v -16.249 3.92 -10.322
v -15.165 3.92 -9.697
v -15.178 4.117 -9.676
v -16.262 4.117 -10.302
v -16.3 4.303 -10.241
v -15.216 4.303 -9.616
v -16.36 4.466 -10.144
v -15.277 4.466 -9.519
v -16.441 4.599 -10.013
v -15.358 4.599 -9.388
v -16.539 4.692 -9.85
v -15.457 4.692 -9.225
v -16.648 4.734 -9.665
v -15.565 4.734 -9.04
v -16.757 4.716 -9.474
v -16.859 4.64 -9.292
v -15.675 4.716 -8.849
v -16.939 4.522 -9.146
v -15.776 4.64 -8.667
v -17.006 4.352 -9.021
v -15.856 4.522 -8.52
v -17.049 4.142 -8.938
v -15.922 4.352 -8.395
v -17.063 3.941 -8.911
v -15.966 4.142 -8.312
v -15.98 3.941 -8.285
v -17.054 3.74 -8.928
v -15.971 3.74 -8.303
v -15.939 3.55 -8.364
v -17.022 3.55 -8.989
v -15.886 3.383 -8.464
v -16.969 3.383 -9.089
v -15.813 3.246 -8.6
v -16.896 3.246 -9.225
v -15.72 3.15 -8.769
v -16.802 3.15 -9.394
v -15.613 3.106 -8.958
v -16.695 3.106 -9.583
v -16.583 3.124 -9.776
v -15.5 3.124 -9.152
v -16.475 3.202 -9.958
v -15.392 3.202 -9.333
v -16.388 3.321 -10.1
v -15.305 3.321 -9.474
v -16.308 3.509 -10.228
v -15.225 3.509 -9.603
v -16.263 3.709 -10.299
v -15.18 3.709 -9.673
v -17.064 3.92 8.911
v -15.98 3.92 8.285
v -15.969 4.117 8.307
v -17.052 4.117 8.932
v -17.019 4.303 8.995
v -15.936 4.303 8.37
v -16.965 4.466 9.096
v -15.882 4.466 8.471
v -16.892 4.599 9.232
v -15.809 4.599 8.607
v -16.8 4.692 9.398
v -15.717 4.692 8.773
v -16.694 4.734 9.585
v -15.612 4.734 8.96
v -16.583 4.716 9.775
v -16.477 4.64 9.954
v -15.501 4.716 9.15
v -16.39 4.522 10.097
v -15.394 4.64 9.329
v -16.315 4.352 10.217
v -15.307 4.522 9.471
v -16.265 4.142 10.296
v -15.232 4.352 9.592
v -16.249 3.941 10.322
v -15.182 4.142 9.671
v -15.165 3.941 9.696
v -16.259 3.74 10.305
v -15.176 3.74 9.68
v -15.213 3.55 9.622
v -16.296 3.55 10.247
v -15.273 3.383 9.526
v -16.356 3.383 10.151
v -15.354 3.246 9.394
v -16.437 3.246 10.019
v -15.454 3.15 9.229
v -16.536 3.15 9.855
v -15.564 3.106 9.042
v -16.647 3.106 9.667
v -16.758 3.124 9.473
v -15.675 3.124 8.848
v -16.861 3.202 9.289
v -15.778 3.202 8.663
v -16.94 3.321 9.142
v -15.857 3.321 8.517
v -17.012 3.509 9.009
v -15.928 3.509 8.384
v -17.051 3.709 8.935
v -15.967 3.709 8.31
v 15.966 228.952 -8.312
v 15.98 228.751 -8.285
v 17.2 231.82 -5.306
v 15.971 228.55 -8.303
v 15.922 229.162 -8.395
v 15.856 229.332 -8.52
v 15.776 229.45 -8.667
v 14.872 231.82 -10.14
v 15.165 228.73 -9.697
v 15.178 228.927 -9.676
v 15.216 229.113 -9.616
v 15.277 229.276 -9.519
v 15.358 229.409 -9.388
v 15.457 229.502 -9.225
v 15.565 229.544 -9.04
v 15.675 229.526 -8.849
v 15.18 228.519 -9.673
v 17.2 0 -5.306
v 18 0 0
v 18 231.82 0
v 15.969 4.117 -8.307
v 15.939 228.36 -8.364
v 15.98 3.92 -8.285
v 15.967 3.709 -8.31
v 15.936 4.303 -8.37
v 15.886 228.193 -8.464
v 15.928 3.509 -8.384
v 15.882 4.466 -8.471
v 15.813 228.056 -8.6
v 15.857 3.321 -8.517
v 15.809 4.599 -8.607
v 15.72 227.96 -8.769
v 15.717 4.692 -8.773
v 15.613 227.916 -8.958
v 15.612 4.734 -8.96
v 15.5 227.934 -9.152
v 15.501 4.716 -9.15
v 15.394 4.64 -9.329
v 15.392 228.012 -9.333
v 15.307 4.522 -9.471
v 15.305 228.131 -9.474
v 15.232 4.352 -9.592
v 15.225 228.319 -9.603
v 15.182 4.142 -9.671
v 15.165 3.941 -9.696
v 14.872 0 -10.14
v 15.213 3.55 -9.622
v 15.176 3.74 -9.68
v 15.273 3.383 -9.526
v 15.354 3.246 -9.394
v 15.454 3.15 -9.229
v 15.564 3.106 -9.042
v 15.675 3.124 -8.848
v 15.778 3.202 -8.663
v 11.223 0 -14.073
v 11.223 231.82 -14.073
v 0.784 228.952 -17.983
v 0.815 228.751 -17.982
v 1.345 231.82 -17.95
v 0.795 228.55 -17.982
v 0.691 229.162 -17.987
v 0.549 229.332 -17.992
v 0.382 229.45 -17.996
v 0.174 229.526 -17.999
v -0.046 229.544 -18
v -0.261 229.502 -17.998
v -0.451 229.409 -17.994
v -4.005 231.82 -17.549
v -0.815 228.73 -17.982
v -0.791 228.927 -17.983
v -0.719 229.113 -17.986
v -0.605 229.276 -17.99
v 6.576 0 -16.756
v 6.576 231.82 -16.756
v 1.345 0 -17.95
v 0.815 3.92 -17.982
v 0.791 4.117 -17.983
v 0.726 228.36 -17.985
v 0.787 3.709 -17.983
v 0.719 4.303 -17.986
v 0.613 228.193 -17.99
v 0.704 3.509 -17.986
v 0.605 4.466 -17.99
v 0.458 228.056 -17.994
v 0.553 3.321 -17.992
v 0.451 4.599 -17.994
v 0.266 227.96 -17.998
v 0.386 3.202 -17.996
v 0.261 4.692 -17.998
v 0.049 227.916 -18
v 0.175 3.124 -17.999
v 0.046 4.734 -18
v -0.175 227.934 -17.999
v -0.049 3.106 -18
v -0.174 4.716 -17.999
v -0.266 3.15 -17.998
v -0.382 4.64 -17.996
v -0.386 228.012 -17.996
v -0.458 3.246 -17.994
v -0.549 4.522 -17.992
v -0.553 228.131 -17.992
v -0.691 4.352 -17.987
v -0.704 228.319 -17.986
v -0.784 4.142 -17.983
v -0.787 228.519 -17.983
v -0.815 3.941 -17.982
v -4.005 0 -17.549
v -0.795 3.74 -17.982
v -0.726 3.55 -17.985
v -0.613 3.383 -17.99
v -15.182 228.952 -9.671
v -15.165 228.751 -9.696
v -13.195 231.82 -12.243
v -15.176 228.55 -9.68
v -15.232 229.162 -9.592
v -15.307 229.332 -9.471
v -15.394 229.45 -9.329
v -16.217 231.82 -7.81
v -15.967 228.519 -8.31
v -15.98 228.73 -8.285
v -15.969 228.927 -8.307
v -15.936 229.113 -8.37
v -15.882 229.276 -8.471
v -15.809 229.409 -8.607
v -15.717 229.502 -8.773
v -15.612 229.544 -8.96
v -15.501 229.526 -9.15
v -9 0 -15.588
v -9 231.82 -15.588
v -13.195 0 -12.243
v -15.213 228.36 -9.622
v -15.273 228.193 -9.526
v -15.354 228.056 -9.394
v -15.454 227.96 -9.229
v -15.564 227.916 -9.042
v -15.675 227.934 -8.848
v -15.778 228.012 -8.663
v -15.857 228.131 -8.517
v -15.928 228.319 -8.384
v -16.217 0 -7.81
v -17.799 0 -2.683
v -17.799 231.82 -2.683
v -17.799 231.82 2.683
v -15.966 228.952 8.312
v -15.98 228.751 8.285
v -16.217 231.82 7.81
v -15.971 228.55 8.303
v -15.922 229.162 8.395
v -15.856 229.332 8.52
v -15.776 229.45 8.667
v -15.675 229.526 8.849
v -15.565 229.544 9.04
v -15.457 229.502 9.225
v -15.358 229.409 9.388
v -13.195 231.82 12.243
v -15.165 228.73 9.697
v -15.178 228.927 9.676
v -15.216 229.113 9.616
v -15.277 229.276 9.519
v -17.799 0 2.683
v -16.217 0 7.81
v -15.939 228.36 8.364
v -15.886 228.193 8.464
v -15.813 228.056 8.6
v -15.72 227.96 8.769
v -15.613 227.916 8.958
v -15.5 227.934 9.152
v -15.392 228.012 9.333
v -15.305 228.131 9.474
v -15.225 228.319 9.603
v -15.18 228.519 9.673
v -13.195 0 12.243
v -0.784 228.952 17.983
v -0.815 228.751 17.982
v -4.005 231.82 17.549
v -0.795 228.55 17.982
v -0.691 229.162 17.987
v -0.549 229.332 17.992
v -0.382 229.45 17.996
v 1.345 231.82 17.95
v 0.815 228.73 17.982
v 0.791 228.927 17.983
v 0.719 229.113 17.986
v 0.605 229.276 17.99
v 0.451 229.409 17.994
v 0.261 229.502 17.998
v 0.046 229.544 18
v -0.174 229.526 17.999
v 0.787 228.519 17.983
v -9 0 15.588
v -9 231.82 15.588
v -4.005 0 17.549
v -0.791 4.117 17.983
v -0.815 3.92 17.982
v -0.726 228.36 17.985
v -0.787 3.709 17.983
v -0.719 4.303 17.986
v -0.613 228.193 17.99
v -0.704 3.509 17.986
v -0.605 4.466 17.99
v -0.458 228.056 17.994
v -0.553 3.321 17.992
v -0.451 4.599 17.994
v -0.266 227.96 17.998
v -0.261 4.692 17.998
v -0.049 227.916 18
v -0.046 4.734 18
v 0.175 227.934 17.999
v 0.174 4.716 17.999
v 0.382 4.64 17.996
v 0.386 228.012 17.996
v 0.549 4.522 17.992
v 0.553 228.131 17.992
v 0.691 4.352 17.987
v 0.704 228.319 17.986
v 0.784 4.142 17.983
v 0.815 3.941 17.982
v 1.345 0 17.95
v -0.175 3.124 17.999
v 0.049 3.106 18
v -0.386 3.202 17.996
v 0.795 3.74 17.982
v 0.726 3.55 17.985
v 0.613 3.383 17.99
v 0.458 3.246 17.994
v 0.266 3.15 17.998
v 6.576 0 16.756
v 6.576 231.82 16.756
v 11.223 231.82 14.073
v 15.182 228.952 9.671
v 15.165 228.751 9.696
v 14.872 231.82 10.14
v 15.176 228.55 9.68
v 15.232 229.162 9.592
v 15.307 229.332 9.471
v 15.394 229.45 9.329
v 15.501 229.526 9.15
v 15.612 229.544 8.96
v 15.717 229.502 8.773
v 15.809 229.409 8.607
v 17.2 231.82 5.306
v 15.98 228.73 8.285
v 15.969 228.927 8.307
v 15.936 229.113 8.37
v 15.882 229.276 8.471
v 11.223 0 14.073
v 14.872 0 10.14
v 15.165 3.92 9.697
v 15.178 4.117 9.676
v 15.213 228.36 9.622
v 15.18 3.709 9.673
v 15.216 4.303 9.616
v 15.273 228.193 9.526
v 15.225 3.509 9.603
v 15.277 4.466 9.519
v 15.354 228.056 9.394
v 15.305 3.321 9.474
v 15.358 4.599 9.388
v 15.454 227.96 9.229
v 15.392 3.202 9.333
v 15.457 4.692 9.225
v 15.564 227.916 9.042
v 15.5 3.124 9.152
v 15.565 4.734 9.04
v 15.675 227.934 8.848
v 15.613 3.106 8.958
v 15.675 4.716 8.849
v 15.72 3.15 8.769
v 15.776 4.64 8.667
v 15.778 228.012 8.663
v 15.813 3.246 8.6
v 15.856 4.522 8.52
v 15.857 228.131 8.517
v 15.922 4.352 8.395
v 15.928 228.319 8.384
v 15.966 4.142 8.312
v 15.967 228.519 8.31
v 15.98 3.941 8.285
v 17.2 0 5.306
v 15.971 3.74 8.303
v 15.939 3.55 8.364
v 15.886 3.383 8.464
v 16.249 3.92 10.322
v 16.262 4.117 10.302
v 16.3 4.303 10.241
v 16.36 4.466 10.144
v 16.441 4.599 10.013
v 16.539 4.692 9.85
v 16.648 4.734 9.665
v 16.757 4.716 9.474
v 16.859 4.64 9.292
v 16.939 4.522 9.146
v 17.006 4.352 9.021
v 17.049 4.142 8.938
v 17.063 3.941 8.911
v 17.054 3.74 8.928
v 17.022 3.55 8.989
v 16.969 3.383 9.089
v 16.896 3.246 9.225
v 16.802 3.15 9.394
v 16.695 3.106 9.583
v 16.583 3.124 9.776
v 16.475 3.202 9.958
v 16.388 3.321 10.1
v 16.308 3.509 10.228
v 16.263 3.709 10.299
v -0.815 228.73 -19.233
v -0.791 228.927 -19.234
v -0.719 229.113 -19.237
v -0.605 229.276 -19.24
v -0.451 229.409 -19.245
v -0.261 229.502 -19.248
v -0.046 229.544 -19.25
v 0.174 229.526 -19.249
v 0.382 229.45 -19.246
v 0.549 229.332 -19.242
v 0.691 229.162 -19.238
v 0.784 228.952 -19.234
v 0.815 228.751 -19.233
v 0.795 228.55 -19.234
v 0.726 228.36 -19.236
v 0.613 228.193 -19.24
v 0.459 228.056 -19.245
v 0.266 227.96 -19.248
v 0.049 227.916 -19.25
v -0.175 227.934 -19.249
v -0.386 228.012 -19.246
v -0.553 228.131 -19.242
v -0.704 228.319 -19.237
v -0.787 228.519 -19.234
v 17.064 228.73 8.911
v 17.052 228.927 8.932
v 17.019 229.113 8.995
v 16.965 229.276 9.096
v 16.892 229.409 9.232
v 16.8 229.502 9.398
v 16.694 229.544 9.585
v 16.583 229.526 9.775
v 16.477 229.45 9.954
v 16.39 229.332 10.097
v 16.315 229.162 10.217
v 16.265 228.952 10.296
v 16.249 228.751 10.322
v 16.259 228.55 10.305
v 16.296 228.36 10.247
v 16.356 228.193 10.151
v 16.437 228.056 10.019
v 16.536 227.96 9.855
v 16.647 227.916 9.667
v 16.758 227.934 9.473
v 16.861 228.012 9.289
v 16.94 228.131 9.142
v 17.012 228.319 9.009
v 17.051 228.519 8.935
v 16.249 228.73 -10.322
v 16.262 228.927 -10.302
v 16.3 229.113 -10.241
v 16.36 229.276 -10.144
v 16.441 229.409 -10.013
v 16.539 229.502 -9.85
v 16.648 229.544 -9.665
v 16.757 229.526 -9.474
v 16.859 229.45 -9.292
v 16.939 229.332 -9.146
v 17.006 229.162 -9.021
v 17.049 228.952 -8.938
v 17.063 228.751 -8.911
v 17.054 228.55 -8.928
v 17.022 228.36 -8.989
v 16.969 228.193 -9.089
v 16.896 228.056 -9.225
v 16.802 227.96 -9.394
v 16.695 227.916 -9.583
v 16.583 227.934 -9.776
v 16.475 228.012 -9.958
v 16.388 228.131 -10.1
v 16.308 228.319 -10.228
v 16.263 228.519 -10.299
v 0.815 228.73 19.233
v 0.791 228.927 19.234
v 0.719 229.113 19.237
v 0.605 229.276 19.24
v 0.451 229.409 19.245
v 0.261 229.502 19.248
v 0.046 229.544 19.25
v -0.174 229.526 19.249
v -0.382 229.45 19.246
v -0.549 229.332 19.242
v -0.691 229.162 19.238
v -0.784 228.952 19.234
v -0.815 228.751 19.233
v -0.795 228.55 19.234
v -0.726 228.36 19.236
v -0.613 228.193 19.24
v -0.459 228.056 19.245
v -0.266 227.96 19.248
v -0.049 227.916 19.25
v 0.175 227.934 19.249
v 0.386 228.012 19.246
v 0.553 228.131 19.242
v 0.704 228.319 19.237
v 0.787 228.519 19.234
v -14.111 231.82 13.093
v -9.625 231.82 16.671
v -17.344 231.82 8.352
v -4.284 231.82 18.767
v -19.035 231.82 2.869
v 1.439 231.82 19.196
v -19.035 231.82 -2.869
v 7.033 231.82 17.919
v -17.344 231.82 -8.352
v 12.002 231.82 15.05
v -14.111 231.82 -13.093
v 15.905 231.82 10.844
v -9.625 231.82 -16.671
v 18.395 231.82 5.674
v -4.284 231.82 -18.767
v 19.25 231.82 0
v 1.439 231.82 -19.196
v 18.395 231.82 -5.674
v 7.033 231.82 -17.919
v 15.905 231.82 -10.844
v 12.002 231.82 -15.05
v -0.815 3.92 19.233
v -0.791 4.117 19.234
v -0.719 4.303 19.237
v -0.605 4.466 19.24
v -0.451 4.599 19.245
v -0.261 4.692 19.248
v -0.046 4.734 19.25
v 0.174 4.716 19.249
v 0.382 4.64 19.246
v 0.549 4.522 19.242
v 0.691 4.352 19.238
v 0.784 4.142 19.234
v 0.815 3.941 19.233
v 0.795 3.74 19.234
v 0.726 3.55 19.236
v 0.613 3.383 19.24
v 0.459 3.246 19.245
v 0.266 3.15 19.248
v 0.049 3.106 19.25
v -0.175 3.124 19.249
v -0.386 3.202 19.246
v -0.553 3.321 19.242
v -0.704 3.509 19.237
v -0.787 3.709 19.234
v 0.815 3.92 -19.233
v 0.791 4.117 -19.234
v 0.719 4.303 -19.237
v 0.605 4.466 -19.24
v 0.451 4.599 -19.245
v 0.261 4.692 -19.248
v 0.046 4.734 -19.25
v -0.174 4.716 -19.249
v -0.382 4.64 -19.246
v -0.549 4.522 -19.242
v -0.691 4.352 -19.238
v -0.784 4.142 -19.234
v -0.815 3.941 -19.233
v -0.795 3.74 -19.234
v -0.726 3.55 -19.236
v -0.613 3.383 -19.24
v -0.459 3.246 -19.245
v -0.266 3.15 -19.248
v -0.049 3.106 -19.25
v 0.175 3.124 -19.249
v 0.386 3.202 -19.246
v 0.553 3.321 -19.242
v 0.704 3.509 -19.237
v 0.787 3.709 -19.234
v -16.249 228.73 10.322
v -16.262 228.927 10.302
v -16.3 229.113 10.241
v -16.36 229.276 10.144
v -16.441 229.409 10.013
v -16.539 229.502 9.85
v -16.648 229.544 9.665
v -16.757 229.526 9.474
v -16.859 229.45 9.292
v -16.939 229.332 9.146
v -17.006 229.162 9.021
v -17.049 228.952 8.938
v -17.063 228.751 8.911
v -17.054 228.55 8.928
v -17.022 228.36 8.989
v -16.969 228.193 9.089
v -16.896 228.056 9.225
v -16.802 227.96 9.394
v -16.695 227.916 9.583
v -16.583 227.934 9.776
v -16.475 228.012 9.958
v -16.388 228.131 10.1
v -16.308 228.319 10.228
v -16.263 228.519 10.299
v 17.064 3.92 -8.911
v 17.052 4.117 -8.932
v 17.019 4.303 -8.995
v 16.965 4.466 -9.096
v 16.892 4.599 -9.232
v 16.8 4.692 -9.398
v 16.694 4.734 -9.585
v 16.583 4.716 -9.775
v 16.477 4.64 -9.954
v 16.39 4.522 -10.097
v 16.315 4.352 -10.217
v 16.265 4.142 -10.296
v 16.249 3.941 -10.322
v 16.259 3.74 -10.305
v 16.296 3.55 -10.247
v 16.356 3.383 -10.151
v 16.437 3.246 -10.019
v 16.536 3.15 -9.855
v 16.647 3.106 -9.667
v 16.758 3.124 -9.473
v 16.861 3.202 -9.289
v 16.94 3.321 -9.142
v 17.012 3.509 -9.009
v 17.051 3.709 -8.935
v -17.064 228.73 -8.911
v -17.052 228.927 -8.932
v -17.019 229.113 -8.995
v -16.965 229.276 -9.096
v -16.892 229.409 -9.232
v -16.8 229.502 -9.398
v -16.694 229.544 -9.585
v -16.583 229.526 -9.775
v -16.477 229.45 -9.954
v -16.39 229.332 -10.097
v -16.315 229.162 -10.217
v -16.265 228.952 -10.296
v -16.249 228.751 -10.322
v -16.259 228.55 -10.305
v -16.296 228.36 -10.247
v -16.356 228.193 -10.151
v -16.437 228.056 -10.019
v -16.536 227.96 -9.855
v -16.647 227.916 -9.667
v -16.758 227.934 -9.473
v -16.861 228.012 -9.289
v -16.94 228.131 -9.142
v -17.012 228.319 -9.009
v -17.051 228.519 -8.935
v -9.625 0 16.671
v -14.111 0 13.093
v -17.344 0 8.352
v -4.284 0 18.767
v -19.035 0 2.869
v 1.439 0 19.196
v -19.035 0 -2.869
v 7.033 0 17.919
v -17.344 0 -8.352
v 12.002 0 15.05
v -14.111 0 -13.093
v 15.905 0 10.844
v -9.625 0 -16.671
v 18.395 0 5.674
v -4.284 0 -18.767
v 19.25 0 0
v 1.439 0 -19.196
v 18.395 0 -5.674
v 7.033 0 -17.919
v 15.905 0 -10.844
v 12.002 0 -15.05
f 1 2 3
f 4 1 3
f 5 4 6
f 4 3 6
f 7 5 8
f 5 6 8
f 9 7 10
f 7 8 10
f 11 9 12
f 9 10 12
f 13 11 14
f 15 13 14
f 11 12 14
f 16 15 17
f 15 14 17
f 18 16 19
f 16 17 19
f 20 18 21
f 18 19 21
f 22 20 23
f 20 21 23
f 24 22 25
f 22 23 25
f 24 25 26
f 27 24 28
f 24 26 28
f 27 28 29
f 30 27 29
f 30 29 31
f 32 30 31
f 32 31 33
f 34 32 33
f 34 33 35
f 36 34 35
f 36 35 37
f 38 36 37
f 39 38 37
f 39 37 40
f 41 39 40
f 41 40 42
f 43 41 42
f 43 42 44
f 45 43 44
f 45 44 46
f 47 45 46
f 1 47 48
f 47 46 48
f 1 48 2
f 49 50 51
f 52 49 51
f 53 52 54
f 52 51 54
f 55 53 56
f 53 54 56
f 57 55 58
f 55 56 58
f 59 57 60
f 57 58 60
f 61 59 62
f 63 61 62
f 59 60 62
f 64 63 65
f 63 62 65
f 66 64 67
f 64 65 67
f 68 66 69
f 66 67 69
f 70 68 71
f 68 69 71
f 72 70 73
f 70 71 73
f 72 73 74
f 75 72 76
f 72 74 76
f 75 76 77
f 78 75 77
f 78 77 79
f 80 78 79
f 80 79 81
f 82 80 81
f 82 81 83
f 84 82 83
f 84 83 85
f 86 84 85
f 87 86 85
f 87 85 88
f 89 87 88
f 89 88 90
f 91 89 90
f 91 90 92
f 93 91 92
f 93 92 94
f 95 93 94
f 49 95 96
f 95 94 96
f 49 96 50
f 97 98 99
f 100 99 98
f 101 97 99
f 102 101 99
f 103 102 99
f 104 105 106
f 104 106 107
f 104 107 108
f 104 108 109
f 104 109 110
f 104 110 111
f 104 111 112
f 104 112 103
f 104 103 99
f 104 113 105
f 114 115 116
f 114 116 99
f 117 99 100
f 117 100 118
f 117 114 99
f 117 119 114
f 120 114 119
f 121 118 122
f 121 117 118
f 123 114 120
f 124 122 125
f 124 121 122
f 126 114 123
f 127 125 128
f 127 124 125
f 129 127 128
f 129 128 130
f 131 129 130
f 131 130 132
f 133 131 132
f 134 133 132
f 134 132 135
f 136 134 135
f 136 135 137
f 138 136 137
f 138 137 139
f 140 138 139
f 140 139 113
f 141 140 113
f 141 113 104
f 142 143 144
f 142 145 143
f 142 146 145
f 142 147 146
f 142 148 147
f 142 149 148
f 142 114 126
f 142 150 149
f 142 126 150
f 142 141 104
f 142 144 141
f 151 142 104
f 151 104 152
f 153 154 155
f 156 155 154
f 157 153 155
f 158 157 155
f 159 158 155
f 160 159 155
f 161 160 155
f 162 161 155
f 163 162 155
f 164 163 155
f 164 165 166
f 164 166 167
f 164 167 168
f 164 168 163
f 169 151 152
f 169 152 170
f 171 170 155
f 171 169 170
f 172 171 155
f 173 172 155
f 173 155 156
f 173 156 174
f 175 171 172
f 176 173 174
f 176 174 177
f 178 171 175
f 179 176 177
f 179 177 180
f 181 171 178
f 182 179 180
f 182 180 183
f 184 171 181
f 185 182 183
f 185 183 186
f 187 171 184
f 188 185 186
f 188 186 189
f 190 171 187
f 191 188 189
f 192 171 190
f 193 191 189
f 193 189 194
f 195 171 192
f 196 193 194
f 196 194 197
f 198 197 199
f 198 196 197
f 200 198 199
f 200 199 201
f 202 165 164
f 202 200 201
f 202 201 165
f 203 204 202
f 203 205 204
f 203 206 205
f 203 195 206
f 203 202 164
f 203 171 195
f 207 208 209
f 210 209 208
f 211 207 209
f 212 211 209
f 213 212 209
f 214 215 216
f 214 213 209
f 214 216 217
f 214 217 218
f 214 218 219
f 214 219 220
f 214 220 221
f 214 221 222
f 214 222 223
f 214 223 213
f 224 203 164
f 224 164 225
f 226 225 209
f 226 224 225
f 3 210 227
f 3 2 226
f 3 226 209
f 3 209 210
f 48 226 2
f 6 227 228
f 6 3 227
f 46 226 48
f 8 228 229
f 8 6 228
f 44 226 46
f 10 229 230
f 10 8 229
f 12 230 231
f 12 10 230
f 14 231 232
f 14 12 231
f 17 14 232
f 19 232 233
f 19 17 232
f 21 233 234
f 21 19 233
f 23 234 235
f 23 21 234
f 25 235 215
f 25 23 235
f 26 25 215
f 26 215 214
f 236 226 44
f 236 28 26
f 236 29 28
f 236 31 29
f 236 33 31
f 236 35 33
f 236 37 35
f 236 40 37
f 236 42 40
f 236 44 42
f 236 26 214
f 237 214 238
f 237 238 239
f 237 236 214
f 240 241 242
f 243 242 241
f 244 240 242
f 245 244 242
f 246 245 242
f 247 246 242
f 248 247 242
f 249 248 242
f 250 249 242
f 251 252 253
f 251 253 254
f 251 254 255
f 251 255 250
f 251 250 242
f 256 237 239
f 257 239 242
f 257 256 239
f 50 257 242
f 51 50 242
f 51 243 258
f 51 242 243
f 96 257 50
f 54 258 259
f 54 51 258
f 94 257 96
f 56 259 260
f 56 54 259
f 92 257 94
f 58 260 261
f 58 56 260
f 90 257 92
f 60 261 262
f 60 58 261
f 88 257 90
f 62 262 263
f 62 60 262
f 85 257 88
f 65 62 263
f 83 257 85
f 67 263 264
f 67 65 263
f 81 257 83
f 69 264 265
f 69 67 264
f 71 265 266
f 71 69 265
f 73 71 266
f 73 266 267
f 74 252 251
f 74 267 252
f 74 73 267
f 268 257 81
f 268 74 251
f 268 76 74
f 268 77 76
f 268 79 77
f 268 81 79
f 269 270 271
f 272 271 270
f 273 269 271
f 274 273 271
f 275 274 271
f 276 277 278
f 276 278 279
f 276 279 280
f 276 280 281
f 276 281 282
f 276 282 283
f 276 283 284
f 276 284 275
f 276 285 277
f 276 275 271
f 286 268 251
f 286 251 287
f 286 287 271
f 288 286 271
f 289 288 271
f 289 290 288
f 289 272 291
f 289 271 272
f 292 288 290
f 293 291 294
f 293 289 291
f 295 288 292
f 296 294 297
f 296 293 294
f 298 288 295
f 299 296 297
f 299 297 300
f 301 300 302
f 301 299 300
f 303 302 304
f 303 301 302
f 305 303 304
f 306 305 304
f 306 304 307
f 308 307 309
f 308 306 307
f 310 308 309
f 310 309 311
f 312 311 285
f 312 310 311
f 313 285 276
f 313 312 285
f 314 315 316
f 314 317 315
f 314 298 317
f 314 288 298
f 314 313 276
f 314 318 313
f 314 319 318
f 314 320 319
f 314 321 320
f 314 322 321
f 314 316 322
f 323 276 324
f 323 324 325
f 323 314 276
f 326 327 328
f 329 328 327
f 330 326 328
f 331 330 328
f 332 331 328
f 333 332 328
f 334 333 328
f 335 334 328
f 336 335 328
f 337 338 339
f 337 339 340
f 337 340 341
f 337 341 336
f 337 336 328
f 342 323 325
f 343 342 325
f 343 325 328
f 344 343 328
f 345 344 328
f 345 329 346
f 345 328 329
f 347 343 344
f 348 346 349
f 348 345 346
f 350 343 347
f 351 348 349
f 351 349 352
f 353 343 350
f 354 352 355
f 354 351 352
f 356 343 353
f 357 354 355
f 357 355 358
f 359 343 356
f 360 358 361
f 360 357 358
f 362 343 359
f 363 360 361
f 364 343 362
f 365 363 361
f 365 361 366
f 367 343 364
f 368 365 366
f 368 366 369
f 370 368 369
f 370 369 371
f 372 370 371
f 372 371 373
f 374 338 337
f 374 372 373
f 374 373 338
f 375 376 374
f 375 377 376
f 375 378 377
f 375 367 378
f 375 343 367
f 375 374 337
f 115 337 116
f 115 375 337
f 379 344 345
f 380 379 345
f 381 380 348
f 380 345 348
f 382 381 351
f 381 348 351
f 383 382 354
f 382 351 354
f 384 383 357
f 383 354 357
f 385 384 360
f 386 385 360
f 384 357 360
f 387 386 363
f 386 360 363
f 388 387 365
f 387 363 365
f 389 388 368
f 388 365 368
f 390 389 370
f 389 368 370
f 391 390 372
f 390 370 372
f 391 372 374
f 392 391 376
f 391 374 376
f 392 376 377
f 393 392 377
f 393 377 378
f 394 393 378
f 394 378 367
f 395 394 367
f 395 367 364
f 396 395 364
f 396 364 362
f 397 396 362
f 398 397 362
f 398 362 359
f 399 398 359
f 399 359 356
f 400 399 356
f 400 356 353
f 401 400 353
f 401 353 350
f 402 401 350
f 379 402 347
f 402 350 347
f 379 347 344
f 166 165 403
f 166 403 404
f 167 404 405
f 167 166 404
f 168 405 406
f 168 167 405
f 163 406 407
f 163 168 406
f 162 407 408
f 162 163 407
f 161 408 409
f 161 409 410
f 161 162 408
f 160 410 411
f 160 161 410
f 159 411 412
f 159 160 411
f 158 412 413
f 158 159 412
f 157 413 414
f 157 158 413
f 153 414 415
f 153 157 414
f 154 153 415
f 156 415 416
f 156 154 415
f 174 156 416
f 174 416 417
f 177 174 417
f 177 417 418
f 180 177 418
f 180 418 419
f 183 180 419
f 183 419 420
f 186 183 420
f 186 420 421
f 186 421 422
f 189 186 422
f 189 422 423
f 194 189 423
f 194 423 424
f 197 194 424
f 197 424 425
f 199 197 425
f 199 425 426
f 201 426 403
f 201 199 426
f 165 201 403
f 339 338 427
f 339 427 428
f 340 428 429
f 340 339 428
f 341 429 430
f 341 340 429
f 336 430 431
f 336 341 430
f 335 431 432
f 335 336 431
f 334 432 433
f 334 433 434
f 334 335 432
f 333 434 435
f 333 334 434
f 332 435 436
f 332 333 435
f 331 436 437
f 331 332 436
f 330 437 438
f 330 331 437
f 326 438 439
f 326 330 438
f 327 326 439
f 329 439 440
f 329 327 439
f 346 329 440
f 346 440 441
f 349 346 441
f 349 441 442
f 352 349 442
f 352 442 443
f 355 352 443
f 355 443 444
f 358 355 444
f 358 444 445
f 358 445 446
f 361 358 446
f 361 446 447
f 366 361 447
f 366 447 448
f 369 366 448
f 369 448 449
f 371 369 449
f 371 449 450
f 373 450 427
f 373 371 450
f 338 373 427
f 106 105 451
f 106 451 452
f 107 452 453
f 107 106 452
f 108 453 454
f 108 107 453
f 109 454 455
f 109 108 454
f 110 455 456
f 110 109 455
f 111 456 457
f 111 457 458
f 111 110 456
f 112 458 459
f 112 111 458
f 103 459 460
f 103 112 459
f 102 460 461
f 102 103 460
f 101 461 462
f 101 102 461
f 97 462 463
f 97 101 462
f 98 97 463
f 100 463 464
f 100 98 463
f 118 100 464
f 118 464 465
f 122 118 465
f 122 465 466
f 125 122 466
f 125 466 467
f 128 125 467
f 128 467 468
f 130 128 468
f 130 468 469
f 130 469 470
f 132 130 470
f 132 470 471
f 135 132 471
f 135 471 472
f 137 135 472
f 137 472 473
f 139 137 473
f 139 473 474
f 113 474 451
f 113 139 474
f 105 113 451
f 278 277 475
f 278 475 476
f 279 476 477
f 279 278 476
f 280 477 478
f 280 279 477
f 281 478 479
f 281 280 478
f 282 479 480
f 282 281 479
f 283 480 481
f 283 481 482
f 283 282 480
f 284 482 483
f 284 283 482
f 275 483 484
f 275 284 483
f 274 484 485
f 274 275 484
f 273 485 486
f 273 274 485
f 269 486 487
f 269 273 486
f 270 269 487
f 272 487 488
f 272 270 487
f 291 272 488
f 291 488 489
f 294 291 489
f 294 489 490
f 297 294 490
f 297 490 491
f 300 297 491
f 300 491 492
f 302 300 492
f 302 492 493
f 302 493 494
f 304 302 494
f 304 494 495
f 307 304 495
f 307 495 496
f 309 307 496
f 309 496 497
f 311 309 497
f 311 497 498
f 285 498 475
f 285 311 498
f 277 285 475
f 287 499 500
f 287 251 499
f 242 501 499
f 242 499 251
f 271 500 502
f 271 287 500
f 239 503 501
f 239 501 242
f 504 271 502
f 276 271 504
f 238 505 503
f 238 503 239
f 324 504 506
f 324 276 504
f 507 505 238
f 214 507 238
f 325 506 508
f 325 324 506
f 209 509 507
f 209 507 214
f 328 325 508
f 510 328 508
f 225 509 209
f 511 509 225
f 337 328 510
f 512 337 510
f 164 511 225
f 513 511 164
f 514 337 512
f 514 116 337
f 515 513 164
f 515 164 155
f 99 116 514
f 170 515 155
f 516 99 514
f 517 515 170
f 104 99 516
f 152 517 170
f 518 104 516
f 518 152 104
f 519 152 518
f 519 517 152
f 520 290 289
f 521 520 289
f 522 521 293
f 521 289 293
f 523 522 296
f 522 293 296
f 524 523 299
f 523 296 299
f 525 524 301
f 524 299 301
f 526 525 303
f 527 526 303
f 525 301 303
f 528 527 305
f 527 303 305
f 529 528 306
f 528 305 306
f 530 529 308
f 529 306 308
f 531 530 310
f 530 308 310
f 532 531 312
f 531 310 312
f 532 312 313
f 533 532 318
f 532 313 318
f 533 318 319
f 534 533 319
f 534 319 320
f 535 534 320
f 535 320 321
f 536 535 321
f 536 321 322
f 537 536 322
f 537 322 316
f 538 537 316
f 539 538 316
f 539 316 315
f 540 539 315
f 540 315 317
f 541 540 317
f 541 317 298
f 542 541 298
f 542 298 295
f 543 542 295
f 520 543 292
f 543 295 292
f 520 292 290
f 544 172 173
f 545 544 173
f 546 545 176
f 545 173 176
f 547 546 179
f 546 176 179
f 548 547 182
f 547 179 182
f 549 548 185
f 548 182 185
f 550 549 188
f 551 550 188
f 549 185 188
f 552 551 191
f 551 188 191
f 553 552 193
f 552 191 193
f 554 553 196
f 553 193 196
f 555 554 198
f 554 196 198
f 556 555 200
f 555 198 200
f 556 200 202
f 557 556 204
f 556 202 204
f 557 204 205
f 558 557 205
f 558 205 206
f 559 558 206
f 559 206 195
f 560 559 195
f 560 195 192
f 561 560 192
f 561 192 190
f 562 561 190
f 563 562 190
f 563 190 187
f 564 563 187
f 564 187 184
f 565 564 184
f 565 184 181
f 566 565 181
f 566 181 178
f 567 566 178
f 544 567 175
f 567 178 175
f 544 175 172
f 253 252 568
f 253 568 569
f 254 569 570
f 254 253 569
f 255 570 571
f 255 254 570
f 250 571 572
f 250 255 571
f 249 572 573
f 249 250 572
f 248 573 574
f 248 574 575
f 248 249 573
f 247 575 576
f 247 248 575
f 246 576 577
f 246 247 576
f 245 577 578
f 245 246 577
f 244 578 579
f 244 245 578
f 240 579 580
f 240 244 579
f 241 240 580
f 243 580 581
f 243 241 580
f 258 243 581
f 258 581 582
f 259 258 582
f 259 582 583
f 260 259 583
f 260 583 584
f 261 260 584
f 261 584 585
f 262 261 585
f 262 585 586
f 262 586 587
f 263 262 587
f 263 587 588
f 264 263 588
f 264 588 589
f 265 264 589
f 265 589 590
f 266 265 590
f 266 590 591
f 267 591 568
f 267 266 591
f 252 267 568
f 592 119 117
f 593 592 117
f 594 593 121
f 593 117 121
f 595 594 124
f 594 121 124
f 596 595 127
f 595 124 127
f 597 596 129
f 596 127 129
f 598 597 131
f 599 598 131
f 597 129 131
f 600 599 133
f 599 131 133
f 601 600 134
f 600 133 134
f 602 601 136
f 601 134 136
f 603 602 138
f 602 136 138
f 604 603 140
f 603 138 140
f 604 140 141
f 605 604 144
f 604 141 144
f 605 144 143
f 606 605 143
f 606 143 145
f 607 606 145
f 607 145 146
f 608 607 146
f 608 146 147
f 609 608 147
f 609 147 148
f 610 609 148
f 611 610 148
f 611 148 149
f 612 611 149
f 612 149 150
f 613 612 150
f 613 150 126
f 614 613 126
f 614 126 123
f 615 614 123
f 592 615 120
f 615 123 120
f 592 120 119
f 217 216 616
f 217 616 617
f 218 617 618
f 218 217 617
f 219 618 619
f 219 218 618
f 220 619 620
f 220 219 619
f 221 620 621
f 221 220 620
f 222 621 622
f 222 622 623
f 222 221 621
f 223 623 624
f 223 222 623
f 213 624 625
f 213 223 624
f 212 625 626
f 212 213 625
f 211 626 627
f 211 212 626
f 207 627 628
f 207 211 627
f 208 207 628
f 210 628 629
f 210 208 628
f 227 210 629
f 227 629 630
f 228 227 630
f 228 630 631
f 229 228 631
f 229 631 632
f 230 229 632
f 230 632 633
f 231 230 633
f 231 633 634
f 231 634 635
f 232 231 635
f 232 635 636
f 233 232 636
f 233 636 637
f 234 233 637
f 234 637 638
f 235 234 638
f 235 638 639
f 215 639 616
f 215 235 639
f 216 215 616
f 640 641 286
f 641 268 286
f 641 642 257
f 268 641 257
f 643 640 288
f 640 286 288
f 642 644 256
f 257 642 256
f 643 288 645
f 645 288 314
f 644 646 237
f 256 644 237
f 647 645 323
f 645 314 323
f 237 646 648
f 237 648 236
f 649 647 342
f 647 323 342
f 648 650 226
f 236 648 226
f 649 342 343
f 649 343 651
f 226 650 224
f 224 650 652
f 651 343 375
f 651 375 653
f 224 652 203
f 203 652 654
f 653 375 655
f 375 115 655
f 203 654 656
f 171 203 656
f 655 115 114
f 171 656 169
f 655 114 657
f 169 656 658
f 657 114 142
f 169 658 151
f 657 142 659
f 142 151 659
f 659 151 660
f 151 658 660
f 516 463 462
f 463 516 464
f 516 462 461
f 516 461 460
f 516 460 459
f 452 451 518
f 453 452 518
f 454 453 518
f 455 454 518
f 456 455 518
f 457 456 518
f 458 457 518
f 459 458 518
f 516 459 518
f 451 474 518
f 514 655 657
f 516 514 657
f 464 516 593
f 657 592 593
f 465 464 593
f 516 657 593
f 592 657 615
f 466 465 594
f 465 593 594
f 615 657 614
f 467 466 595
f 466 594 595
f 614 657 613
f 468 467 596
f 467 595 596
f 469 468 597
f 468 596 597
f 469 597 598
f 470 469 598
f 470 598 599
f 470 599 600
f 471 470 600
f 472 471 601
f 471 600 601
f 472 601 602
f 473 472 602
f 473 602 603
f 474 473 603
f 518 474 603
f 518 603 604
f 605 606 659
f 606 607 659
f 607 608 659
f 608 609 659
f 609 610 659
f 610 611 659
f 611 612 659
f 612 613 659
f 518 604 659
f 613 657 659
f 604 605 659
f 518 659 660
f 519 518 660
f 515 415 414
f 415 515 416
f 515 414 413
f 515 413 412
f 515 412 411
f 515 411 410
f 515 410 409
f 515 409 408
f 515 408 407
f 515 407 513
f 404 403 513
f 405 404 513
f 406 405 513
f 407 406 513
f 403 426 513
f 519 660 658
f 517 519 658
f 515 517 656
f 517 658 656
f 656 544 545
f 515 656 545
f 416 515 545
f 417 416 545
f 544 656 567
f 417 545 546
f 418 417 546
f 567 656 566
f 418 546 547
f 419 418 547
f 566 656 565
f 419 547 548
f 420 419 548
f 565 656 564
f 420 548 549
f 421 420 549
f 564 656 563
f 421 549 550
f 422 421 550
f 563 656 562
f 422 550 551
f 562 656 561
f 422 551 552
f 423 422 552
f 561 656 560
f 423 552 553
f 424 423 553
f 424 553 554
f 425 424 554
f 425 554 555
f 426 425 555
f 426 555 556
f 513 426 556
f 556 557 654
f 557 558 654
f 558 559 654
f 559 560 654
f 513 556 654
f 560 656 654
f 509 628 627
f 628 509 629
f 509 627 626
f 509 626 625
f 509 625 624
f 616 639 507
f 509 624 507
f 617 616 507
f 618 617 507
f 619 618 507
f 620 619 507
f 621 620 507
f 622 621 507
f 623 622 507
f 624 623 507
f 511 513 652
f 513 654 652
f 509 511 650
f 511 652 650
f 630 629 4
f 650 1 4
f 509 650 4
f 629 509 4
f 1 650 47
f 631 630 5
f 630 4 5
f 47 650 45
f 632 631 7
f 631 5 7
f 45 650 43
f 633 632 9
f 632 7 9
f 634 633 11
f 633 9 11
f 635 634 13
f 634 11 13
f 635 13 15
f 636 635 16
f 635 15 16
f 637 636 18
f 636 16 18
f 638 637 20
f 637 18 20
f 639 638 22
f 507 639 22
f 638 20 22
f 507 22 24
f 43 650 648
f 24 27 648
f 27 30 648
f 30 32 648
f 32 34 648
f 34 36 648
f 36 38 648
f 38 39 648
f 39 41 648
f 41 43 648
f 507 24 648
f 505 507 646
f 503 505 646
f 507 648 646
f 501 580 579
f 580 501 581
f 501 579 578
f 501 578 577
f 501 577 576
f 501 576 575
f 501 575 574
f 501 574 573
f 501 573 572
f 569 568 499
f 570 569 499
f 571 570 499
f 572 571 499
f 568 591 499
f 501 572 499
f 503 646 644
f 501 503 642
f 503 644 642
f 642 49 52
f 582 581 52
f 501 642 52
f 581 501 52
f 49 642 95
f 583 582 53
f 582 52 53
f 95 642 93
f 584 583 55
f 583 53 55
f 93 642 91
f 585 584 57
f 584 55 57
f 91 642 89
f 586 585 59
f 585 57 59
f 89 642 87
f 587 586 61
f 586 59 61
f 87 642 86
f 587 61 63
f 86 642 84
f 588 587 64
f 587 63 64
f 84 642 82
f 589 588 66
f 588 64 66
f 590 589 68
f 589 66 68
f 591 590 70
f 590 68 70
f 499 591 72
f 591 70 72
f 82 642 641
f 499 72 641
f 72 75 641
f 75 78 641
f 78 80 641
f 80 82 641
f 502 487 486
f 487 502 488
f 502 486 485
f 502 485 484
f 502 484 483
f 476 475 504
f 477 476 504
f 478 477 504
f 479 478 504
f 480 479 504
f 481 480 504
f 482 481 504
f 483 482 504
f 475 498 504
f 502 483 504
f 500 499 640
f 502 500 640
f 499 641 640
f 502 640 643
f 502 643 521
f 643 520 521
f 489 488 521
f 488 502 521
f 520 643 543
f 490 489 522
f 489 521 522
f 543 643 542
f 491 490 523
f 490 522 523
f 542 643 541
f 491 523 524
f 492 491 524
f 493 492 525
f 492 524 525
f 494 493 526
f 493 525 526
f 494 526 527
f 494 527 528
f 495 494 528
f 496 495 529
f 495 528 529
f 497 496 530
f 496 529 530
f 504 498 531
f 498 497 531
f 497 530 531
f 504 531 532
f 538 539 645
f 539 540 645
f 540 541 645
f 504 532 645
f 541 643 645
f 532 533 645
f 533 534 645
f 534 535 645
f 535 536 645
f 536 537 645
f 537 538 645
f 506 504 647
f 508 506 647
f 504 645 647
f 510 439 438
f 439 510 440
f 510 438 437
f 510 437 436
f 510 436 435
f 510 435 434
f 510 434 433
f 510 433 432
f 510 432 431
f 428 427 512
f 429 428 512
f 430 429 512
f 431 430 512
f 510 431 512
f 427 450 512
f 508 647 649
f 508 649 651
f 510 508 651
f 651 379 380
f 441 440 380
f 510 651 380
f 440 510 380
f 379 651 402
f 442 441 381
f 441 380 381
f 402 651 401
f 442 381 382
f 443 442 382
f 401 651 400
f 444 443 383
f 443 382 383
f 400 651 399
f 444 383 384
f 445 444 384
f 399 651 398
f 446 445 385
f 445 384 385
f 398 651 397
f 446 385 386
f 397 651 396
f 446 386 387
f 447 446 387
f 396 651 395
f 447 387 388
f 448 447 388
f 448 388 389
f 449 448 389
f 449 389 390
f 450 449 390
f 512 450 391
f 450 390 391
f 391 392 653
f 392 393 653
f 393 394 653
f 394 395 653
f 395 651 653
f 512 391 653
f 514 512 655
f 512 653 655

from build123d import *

# Parameters (mm, degrees)
SKETCH2_R           = 19.25
SKETCH2_R_2         = 18
BOSS_EXTRUDE1_DEPTH = 231.82
SKETCH3_R           = 0.815
CUT_EXTRUDE2_DEPTH  = 231.82
CIRPATTERN3_COUNT   = 6
SKETCH4_R           = 0.815
CUT_EXTRUDE3_DEPTH  = 231.82
CIRPATTERN4_COUNT   = 6


with BuildPart() as part:
    # Sketch2 → Boss-Extrude1 (new body)
    with BuildSketch(Plane(origin=(0, 0, 0), x_dir=(1, 0, 0), z_dir=(0, 1, 0))):
        Circle(SKETCH2_R)
        Circle(SKETCH2_R_2, mode=Mode.SUBTRACT)
    extrude(amount=BOSS_EXTRUDE1_DEPTH)

    # Sketch3 → Cut-Extrude2 (cut)
    with BuildSketch(Plane.XY):
        with Locations((0, 3.92)):
            Circle(SKETCH3_R)
    cut_extrude2 = extrude(amount=-CUT_EXTRUDE2_DEPTH, mode=Mode.SUBTRACT)

    # CirPattern3: Cut-Extrude2 ×6 about axis
    cirpattern3_axis = Axis((0, 231.82, 0), (0, -1, 0))
    for i in range(1, CIRPATTERN3_COUNT):
        add(cut_extrude2.rotate(cirpattern3_axis, i * 360 / CIRPATTERN3_COUNT), mode=Mode.SUBTRACT)

    # Sketch4 → Cut-Extrude3 (cut)
    with BuildSketch(Plane.XY):
        with Locations((0, 228.73)):
            Circle(SKETCH4_R)
    cut_extrude3 = extrude(amount=CUT_EXTRUDE3_DEPTH, mode=Mode.SUBTRACT)

    # CirPattern4: Cut-Extrude3 ×6 about axis
    cirpattern4_axis = Axis((0, 231.82, 0), (0, -1, 0))
    for i in range(1, CIRPATTERN4_COUNT):
        add(cut_extrude3.rotate(cirpattern4_axis, i * 360 / CIRPATTERN4_COUNT), mode=Mode.SUBTRACT)


solid = part.part
